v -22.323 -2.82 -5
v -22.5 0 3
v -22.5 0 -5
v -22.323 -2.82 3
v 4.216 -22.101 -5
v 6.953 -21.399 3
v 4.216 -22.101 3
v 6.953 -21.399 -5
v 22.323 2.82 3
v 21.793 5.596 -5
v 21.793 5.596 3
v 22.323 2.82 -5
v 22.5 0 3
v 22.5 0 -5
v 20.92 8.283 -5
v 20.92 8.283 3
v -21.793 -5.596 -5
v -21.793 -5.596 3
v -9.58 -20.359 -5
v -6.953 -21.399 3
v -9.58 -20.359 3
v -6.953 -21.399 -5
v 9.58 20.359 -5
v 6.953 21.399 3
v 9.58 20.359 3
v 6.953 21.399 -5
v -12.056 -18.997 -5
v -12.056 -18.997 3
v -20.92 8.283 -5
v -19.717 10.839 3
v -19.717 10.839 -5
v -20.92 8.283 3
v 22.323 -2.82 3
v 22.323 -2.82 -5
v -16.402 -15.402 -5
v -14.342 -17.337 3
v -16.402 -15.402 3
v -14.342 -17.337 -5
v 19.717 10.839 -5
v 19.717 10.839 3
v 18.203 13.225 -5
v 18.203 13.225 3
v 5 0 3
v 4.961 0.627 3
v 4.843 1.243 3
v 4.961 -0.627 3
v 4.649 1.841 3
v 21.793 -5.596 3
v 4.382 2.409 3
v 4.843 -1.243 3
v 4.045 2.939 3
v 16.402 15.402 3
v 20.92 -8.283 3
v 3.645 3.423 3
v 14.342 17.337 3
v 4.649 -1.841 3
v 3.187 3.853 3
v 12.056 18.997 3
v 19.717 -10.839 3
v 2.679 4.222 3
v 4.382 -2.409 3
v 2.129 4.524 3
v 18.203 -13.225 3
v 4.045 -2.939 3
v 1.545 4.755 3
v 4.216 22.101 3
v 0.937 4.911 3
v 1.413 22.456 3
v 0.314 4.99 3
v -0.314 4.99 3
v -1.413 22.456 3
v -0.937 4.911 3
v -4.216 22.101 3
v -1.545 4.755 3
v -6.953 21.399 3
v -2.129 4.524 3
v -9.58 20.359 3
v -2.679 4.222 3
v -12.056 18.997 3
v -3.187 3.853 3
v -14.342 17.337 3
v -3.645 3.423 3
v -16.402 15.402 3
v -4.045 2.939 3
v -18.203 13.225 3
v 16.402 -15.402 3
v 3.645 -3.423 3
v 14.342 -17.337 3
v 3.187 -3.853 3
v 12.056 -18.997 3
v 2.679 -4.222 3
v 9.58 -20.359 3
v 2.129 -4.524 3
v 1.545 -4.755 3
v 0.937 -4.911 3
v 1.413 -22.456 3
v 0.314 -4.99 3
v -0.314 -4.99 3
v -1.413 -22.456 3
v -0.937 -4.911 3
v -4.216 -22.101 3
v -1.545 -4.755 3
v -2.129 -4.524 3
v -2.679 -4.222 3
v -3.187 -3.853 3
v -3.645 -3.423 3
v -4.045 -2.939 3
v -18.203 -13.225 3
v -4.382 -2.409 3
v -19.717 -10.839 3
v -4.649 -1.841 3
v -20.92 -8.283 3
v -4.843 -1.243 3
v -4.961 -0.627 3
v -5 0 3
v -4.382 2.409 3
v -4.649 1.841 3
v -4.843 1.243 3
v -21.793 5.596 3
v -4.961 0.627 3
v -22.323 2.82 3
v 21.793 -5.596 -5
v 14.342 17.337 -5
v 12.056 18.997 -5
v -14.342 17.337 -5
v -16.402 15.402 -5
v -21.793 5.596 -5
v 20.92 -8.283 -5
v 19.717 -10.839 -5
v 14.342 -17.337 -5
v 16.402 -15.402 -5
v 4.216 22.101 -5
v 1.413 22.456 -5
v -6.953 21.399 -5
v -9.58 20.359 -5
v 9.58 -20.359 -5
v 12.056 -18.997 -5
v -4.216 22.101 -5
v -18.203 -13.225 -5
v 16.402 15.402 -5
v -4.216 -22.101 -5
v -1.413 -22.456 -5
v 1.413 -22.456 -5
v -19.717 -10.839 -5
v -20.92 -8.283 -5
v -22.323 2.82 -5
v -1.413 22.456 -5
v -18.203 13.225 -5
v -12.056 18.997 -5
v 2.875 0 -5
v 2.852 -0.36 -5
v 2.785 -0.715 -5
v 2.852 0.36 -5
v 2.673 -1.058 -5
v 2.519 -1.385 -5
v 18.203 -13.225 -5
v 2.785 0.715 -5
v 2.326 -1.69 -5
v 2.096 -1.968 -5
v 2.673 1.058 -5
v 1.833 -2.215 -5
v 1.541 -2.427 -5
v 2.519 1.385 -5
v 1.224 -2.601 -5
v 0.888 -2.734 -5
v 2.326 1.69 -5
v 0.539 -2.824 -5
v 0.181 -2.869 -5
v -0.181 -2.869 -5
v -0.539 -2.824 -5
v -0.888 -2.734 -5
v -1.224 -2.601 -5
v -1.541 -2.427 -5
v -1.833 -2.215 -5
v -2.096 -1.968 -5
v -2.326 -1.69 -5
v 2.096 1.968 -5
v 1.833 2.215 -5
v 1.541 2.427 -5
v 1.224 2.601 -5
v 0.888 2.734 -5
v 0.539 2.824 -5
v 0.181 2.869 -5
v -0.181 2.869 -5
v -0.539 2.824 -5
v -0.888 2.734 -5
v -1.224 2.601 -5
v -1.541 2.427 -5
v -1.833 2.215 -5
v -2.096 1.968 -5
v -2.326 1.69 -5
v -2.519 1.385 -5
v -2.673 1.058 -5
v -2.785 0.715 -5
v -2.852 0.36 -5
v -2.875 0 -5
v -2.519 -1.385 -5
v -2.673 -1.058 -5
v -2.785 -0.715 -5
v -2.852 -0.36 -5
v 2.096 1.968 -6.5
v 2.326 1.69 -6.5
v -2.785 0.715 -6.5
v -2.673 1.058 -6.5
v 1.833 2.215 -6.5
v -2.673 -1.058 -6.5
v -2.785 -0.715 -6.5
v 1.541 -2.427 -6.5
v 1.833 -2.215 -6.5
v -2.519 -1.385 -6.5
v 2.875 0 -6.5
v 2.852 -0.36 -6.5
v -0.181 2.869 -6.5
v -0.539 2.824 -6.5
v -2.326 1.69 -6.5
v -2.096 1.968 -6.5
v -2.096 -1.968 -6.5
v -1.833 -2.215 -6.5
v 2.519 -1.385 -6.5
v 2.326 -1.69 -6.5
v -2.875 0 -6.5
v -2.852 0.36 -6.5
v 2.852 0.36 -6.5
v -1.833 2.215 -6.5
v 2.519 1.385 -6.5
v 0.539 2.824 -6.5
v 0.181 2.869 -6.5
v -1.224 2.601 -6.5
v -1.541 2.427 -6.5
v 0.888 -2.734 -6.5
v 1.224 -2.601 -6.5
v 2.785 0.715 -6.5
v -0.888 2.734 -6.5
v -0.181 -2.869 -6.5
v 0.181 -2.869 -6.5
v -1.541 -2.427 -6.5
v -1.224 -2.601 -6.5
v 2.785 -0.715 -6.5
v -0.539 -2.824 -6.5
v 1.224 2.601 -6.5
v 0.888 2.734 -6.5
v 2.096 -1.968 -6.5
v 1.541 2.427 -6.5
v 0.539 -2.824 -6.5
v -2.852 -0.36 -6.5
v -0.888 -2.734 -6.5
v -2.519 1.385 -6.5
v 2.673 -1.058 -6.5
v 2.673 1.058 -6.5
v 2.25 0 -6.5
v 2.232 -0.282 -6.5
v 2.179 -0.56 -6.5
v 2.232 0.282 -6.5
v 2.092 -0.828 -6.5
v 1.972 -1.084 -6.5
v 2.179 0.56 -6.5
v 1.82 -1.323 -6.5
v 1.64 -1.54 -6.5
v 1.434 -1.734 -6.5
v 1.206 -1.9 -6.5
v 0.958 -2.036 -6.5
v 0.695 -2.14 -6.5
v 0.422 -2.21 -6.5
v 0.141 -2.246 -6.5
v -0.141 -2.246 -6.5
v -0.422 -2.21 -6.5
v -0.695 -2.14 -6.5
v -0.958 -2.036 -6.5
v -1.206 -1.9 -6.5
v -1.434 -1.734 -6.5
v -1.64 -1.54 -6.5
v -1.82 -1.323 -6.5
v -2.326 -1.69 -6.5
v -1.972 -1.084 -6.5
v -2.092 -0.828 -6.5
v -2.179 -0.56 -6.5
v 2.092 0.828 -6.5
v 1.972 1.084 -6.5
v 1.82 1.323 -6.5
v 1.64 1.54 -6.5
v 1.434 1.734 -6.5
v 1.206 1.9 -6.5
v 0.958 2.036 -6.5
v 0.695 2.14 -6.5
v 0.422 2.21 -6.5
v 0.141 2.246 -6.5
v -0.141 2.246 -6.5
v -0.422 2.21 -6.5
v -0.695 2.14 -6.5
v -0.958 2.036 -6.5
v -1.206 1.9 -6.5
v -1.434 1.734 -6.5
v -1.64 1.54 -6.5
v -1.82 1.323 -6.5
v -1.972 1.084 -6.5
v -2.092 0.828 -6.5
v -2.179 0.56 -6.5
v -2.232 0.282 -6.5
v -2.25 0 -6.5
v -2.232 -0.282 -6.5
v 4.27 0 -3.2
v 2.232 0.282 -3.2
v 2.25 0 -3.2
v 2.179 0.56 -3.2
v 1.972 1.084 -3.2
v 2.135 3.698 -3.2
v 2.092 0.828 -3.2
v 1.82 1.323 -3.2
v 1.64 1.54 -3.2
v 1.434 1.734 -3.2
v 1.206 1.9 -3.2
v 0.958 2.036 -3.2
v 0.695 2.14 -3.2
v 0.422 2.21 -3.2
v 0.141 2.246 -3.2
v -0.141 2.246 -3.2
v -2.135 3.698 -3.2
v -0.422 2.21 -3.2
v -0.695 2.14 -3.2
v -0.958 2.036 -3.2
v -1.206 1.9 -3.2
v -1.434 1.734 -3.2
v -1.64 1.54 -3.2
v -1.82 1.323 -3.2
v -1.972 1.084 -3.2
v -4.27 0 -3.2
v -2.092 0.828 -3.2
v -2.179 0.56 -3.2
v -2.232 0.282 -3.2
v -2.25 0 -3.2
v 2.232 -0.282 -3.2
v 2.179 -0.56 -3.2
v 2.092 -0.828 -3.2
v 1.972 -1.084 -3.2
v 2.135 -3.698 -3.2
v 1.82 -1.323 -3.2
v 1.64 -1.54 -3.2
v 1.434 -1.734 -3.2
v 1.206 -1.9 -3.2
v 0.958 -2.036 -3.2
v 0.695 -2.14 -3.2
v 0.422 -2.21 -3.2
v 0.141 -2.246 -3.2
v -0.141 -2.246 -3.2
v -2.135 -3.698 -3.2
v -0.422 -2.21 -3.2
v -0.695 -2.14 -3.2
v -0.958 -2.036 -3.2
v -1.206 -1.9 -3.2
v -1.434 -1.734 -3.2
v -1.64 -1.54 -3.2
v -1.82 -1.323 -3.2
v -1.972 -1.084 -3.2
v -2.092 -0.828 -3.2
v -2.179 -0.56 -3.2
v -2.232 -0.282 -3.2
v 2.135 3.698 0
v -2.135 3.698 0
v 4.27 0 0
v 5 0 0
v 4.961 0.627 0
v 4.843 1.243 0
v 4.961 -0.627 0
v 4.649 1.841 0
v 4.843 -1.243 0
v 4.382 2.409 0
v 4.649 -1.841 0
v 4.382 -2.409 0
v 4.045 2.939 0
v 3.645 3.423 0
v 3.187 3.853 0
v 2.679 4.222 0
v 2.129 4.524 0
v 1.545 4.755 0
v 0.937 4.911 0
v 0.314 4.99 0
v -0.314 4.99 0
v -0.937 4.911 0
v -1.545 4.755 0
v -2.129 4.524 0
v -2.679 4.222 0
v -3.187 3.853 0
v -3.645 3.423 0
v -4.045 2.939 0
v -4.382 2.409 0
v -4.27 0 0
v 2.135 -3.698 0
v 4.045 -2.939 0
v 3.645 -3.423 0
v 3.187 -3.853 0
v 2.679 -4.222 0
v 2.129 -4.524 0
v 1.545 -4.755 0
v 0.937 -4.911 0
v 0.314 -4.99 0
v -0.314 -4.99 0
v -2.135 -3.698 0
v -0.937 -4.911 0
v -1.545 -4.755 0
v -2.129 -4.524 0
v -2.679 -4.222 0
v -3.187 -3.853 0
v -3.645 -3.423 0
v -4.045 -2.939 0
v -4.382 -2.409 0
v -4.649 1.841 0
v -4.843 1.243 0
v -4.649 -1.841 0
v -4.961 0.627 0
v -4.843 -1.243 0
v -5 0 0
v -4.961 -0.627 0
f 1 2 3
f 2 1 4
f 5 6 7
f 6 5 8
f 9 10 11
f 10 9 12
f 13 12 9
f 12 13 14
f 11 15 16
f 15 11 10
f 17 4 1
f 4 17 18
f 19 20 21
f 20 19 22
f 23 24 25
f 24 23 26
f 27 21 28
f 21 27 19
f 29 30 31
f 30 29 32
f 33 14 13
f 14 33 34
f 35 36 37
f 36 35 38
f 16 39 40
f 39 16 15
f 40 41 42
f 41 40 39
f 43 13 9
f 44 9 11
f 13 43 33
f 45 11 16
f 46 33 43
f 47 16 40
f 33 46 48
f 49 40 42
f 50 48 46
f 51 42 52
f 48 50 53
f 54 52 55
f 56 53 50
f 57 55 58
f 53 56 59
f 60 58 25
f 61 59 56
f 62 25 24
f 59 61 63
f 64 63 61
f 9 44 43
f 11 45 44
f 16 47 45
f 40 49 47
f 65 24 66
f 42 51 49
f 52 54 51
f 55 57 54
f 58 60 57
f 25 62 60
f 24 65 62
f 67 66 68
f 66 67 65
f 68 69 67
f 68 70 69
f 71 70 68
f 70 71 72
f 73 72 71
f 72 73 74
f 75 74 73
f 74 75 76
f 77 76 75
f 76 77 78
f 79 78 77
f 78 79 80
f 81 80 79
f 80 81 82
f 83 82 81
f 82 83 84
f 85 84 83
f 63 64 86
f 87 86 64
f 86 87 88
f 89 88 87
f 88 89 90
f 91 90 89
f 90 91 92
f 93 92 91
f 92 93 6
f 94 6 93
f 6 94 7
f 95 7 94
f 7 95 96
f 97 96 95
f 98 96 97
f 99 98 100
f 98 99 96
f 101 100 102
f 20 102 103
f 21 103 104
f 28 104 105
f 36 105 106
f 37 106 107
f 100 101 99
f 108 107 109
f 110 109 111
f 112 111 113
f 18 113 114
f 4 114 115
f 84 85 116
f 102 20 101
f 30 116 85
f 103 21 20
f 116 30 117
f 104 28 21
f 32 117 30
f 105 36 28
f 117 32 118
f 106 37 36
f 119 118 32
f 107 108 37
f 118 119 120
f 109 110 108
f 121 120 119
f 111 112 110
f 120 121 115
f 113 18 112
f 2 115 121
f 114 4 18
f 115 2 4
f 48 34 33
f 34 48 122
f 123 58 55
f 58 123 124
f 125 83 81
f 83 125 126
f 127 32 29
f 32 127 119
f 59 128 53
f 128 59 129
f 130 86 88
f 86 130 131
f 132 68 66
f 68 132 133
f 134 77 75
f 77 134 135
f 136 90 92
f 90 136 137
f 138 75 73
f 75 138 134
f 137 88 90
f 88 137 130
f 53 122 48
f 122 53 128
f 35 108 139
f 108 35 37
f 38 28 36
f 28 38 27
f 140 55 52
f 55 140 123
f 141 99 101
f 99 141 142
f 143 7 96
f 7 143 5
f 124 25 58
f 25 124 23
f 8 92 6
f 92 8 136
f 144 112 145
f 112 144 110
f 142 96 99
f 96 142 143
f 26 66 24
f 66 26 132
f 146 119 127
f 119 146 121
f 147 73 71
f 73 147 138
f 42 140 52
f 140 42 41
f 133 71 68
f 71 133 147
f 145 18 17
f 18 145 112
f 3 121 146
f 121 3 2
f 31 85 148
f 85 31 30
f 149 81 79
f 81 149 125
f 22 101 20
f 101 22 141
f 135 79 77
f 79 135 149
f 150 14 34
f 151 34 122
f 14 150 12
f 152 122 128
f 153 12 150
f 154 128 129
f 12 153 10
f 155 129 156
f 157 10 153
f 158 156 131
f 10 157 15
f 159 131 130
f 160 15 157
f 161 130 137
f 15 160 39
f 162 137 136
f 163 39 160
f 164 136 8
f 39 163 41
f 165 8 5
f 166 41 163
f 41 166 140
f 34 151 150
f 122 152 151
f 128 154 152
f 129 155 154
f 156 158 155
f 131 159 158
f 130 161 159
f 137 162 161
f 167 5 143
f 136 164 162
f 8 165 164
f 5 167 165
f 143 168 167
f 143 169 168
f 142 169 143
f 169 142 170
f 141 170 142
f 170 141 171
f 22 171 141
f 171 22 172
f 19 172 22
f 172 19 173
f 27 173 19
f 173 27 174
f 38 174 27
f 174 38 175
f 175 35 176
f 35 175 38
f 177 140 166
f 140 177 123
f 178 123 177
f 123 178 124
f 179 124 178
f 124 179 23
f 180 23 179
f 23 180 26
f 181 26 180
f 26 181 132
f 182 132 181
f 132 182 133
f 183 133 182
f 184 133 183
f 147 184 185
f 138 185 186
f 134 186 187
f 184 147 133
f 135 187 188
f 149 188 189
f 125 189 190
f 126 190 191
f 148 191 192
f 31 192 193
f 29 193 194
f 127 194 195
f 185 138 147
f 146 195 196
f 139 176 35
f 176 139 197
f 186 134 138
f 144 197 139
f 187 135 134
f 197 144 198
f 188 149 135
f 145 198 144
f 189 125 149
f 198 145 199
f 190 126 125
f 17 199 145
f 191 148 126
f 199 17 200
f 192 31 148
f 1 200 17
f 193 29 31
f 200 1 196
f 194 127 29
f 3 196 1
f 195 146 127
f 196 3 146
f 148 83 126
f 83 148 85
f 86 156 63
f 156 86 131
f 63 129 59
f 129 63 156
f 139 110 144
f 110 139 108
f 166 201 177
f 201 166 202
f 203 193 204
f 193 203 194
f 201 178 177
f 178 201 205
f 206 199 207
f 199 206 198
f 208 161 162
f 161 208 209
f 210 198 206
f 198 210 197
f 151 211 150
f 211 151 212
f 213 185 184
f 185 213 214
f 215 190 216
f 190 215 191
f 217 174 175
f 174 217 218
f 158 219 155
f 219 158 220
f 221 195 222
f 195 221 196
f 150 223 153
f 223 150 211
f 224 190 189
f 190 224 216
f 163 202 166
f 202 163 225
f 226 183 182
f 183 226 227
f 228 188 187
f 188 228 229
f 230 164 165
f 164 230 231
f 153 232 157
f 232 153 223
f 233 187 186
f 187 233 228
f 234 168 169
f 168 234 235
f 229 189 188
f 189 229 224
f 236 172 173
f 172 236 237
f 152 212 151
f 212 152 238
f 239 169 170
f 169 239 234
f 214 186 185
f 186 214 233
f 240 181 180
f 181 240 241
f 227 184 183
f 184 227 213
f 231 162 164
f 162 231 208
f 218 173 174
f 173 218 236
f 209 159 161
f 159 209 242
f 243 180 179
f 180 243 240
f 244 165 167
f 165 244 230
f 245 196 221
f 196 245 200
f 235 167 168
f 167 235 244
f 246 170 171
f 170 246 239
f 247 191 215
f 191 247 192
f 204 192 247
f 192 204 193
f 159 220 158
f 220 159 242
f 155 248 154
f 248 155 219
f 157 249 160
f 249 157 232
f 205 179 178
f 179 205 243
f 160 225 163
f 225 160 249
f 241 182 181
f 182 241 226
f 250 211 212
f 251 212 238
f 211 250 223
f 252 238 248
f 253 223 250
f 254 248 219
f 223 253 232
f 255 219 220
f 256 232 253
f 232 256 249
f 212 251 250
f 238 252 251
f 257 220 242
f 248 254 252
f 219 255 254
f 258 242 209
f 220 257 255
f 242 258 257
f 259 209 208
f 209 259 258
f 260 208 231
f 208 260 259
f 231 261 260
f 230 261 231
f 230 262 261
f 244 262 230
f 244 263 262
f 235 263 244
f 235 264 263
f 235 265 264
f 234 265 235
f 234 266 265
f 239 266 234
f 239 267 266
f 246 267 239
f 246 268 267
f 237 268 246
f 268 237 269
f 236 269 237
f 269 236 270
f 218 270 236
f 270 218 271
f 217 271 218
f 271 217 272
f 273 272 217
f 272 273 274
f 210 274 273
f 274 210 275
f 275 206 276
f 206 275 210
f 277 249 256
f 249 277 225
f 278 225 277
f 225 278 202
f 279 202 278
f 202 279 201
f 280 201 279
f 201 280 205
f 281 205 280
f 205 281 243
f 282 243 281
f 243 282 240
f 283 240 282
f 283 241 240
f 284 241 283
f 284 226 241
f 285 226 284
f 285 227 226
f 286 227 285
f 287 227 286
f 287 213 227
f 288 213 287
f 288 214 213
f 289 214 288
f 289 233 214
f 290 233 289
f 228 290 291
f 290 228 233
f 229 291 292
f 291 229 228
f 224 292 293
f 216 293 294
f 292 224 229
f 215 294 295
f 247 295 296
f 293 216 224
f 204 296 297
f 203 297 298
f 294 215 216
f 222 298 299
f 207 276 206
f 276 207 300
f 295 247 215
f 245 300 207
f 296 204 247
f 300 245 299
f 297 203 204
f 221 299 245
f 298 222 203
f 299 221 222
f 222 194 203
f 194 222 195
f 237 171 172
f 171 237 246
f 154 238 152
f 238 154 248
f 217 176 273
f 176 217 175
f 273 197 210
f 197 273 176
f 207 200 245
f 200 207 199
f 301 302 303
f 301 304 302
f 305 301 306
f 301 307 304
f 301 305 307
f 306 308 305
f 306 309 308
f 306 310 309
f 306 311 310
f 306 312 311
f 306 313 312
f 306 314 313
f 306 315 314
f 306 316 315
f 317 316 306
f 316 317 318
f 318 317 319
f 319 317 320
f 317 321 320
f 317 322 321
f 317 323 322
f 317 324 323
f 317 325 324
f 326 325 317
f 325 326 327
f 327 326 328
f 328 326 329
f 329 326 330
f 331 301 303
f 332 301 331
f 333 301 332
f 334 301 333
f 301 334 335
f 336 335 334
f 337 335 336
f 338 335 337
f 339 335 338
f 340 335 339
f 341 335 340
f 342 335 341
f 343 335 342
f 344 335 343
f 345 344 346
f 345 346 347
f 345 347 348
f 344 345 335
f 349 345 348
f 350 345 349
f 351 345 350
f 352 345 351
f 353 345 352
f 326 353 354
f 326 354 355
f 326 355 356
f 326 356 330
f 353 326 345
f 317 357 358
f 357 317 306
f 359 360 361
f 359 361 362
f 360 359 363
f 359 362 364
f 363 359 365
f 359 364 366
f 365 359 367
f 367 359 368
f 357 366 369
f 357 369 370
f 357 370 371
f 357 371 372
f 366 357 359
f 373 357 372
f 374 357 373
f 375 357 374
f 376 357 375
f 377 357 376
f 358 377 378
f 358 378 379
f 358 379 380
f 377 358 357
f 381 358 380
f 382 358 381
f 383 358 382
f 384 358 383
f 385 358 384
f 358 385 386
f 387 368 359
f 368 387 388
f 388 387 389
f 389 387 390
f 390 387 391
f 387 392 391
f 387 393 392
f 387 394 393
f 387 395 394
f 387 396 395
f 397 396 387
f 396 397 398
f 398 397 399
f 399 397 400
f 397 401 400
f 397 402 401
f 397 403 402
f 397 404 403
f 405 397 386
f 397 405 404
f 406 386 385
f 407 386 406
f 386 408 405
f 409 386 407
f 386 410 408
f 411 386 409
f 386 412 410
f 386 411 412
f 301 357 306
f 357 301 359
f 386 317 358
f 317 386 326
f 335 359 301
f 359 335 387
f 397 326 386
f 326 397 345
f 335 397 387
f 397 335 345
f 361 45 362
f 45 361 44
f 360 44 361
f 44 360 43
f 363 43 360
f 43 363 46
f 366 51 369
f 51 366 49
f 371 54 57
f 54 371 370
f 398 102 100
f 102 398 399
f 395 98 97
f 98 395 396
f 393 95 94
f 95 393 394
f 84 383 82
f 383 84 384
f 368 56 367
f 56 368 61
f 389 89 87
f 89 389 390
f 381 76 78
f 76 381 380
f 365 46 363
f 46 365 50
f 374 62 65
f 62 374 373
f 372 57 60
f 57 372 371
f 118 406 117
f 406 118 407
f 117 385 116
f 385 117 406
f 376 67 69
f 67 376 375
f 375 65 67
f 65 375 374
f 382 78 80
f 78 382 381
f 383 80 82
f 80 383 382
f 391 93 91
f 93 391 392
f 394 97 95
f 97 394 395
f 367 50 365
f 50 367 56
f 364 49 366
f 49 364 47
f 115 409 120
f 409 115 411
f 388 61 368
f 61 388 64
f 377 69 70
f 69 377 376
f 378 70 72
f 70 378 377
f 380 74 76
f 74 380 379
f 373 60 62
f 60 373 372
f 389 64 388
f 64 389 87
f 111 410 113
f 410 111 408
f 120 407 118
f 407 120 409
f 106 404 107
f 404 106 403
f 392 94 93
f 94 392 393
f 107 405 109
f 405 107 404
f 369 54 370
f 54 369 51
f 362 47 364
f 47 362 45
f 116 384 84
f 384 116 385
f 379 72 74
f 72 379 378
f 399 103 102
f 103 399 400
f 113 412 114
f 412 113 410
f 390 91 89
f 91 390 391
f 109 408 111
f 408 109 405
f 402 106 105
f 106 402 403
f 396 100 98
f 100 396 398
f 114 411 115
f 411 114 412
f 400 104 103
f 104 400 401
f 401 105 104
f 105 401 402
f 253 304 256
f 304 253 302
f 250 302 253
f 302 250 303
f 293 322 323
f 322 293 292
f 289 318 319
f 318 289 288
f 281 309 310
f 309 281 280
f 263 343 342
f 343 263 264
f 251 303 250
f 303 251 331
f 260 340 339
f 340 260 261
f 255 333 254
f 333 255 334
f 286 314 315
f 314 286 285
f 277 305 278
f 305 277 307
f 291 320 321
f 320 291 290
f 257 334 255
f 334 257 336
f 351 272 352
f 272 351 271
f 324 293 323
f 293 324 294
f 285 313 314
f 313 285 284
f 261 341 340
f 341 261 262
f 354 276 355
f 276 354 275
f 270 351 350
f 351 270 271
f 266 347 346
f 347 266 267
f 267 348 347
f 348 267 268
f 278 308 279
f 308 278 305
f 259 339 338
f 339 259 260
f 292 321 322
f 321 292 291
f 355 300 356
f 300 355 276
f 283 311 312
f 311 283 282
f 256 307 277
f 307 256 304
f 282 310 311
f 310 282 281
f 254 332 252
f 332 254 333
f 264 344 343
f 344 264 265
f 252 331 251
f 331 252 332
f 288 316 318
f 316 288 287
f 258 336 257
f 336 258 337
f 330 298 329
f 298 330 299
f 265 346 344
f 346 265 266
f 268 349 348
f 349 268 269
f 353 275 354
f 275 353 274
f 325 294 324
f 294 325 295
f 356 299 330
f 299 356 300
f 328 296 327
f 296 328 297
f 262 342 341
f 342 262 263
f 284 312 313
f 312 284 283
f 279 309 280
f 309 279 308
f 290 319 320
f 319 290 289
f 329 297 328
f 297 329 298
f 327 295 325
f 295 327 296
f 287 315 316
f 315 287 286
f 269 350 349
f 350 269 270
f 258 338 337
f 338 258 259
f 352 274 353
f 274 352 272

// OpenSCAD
$fn = 50;


difference() {
	union() {
		translate(v = [0, 0, -5.0000000000]) {
			cylinder(h = 8.0000000000, r = 22.5000000000);
		}
		#translate(v = [0, 0, -6.5000000000]) {
			cylinder(h = 6.5000000000, r = 2.8750000000);
		}
	}
	union() {
		translate(v = [0, 0, 0]) {
			rotate(a = [0, 0, 0]) {
				difference() {
					union() {
						translate(v = [0, 0, -3.2000000000]) {
							linear_extrude(height = 3.2000000000) {
								polygon(points = [[4.2698000000, 0.0000000000], [2.1349000000, 3.6977552691], [-2.1349000000, 3.6977552691], [-4.2698000000, 0.0000000000], [-2.1349000000, -3.6977552691], [2.1349000000, -3.6977552691]]);
							}
						}
					}
					union();
				}
			}
		}
		#cylinder(h = 3, r = 5.0000000000);
		#translate(v = [0, 0, -100.0000000000]) {
			cylinder(h = 200, r = 2.2500000000);
		}
	}
}
